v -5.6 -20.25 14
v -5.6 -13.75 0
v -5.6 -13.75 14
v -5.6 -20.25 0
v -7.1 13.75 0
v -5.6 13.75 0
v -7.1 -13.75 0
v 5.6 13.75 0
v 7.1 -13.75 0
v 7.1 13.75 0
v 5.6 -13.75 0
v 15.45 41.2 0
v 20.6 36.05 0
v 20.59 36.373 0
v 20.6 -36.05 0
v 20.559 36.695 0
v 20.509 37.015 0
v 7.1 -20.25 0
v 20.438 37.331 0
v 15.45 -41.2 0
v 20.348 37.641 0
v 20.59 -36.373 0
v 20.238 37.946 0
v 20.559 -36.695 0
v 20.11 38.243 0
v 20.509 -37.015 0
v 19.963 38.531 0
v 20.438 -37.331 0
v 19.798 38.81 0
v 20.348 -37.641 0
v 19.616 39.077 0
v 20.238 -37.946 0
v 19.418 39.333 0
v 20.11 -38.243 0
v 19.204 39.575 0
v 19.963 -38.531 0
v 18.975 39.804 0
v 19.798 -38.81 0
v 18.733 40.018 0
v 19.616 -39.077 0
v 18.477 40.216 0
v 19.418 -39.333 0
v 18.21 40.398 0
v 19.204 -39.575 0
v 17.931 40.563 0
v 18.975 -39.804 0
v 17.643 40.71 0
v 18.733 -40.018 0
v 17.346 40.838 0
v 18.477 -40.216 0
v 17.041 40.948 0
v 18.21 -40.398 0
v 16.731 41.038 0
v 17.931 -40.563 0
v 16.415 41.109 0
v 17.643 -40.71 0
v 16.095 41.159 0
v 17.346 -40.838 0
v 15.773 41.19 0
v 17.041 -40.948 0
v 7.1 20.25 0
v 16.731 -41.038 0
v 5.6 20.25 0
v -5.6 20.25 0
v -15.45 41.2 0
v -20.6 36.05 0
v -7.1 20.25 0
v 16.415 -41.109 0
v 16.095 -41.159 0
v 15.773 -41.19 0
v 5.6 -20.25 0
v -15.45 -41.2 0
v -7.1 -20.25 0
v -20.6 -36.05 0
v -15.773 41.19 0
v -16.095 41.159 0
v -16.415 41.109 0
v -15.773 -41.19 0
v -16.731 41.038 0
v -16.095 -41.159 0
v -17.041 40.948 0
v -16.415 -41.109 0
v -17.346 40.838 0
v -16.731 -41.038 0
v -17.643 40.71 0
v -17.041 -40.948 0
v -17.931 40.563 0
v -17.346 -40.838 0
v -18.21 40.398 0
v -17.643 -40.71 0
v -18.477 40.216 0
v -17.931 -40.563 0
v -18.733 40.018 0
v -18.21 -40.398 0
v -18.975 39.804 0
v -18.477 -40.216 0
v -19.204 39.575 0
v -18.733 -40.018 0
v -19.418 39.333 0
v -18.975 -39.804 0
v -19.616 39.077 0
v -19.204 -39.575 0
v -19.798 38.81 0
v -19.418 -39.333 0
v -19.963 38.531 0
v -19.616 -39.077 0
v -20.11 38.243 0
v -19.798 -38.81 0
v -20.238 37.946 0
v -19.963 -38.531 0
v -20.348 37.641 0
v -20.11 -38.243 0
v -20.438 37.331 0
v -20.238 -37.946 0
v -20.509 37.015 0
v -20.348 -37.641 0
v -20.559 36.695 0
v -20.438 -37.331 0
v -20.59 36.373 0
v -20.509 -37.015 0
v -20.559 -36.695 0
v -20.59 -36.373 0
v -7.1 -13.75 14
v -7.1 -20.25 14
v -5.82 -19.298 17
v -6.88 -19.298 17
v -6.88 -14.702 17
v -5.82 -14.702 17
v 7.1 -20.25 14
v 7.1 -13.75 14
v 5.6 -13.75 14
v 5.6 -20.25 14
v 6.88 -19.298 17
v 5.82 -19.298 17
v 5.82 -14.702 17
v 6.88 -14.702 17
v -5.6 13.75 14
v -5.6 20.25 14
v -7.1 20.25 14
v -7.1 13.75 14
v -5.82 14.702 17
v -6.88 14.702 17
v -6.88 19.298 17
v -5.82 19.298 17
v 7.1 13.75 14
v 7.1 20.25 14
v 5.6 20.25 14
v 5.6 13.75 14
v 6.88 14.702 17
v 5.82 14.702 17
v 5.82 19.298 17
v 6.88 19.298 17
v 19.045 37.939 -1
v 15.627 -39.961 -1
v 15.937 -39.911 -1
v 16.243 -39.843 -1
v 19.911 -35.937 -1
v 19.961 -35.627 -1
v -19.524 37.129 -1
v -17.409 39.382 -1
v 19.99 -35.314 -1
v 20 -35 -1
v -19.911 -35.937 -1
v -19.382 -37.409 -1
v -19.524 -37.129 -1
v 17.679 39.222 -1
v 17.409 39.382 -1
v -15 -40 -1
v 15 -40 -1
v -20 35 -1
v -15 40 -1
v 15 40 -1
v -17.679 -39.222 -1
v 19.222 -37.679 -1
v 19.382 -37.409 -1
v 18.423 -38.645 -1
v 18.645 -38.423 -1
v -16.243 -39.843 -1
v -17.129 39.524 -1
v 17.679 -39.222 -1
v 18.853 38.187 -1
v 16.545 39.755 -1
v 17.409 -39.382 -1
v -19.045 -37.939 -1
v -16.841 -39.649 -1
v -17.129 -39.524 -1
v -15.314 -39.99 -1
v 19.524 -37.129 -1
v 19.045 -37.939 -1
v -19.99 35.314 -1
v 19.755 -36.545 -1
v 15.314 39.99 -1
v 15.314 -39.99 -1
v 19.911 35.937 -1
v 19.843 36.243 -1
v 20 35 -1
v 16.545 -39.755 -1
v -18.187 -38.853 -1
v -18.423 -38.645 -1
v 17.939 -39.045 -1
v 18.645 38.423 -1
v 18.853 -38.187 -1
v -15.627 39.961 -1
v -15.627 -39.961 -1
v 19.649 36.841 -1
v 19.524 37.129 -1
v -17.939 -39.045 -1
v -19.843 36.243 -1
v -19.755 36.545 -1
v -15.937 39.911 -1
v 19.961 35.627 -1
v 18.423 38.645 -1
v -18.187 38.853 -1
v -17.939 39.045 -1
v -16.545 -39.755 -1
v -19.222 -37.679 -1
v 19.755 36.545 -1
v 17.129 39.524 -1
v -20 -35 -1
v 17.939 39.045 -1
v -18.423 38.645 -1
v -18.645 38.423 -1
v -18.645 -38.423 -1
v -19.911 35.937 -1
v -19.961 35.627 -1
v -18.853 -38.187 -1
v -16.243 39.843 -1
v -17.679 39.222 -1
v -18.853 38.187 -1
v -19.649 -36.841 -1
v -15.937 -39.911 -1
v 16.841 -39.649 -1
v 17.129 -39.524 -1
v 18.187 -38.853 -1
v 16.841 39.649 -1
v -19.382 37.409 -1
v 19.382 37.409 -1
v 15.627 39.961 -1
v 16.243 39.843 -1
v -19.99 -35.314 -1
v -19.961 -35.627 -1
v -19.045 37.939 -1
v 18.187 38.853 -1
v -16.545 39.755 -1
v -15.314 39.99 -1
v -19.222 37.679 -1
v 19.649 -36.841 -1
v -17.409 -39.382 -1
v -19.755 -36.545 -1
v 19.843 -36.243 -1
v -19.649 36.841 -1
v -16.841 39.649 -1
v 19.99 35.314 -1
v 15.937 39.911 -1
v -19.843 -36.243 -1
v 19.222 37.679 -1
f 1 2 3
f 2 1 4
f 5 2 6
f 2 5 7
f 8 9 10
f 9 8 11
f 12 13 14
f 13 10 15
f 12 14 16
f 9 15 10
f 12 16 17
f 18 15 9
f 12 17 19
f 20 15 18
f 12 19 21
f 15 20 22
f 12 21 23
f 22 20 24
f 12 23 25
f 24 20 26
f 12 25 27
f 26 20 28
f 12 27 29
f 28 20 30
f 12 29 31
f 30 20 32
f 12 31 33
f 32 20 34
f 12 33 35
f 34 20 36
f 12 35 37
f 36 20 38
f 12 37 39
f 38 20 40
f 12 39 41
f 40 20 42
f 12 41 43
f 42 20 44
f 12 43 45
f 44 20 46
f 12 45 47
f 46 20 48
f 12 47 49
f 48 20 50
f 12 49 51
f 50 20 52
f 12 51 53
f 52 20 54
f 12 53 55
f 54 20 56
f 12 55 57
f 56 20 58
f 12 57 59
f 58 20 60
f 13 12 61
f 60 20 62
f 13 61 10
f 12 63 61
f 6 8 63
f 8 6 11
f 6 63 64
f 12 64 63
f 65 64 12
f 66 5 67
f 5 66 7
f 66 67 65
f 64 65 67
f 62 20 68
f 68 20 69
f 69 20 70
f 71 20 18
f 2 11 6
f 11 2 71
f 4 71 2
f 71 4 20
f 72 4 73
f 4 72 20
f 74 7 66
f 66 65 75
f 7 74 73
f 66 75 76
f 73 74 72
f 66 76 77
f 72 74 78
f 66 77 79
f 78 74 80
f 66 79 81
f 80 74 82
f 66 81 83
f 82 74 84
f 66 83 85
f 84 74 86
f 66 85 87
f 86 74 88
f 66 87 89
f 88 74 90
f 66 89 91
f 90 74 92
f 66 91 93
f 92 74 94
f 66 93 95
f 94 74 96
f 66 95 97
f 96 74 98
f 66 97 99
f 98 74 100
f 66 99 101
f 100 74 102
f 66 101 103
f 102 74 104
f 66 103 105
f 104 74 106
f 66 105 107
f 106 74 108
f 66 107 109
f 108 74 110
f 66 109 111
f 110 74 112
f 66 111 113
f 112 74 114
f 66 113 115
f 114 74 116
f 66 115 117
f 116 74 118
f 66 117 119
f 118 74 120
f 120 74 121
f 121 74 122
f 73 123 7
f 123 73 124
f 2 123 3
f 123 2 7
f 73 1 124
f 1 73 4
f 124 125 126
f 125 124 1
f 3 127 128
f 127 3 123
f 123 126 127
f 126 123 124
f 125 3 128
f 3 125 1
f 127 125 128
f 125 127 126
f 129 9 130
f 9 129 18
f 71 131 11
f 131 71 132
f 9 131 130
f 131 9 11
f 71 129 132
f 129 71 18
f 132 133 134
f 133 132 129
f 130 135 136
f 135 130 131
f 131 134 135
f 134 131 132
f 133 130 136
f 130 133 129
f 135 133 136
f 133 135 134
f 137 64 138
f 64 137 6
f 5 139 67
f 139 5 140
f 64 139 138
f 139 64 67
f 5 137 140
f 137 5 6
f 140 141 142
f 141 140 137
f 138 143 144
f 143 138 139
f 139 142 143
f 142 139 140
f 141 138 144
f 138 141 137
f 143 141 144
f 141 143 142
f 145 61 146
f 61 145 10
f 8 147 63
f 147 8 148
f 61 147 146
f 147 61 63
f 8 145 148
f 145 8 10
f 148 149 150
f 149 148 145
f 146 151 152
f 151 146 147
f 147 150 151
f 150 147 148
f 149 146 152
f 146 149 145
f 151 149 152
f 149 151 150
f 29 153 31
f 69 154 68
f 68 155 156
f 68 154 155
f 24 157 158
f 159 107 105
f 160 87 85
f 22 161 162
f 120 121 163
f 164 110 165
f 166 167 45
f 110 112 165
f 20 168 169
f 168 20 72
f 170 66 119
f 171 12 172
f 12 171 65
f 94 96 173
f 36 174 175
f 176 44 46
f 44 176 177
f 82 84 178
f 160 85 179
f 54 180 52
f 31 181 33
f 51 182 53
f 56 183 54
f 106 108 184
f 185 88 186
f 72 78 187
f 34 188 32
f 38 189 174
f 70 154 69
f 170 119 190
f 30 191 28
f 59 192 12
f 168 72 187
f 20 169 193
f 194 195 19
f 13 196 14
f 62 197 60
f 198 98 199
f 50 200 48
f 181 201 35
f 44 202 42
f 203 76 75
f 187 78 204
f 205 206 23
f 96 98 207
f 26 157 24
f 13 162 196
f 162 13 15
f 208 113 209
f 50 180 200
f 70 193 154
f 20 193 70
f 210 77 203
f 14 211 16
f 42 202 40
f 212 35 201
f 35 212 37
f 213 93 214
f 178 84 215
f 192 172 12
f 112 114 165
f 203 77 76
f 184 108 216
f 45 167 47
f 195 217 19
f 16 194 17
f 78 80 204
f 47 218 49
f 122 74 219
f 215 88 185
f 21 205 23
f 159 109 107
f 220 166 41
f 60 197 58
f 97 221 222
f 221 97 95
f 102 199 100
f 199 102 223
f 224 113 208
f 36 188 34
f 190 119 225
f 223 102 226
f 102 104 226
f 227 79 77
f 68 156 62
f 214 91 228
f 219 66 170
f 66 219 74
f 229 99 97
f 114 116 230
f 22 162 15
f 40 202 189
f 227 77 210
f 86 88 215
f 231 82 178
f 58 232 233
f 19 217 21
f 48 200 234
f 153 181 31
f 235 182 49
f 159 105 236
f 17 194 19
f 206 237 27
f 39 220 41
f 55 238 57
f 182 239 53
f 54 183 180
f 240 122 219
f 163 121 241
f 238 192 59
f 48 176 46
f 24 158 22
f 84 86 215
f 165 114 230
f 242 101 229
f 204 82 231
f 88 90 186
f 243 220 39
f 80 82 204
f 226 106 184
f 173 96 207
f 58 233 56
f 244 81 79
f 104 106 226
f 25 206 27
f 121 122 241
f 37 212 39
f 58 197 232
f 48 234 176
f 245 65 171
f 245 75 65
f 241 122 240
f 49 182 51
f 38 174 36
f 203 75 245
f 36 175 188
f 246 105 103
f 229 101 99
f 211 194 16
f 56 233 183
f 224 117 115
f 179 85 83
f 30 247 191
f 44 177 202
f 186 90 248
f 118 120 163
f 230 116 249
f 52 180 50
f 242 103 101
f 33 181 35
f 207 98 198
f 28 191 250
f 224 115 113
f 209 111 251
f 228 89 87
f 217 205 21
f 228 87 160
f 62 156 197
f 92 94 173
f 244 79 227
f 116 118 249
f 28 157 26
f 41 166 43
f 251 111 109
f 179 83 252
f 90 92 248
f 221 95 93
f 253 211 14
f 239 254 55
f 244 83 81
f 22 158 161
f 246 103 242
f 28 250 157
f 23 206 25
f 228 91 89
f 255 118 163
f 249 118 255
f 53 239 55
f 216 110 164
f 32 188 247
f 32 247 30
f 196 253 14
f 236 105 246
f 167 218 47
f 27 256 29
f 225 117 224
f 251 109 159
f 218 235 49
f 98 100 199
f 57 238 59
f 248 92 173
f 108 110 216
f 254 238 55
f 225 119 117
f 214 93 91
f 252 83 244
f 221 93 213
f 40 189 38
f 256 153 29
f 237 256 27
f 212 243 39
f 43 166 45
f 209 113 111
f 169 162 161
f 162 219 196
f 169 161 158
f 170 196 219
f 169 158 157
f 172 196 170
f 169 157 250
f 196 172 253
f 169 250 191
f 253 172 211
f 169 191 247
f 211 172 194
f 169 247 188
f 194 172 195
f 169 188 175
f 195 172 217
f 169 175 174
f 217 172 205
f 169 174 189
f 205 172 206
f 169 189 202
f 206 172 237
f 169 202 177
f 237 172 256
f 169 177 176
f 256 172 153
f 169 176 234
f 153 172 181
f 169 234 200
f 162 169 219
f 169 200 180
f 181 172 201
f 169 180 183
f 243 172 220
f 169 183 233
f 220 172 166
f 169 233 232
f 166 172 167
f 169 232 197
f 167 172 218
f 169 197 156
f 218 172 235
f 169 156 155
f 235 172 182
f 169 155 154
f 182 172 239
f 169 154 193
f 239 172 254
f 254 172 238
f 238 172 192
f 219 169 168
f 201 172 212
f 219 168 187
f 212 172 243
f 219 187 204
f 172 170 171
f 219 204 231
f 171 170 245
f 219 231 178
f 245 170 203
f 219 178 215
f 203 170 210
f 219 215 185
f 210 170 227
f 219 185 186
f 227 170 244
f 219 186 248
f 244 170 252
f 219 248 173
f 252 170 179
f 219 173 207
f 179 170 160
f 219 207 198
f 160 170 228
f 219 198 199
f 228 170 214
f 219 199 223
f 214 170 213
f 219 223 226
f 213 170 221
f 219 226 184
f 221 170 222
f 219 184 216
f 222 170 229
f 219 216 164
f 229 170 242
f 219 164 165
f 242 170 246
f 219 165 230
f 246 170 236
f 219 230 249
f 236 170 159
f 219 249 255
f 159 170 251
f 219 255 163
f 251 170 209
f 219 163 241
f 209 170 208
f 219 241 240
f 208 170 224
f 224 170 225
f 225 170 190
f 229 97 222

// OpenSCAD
$fn=100;

module jack()
{
    translate([0, 0, (17-3)/2])
            cube([1.5, 6.5, 17 -3 ], center=true);

    translate([0, 0, 17-3])
        scale([1.5/2, 6.5/2, 3])
            rotate(45, [0,0,1])
                cylinder(h=1, r1=sqrt(2), r2=1, $fn=4);
}

module BasePlate()
{
    offset(5) offset(-5)
        square([40,80], center=true);
}


translate([-12.7/2, -34/2, 0]){
    translate([0,0,0]) jack();
    translate([12.7,0,0]) jack();
    translate([0,34,0]) jack();
    translate([12.7,34,0]) jack();
}
//translate([0,0,-0.5]) scale([1.02,1.02,1]) linear_extrude(height=0.5, scale=1) BasePlate(); 
translate([0,0,-1]) linear_extrude(height=1, scale=1.03) BasePlate();
